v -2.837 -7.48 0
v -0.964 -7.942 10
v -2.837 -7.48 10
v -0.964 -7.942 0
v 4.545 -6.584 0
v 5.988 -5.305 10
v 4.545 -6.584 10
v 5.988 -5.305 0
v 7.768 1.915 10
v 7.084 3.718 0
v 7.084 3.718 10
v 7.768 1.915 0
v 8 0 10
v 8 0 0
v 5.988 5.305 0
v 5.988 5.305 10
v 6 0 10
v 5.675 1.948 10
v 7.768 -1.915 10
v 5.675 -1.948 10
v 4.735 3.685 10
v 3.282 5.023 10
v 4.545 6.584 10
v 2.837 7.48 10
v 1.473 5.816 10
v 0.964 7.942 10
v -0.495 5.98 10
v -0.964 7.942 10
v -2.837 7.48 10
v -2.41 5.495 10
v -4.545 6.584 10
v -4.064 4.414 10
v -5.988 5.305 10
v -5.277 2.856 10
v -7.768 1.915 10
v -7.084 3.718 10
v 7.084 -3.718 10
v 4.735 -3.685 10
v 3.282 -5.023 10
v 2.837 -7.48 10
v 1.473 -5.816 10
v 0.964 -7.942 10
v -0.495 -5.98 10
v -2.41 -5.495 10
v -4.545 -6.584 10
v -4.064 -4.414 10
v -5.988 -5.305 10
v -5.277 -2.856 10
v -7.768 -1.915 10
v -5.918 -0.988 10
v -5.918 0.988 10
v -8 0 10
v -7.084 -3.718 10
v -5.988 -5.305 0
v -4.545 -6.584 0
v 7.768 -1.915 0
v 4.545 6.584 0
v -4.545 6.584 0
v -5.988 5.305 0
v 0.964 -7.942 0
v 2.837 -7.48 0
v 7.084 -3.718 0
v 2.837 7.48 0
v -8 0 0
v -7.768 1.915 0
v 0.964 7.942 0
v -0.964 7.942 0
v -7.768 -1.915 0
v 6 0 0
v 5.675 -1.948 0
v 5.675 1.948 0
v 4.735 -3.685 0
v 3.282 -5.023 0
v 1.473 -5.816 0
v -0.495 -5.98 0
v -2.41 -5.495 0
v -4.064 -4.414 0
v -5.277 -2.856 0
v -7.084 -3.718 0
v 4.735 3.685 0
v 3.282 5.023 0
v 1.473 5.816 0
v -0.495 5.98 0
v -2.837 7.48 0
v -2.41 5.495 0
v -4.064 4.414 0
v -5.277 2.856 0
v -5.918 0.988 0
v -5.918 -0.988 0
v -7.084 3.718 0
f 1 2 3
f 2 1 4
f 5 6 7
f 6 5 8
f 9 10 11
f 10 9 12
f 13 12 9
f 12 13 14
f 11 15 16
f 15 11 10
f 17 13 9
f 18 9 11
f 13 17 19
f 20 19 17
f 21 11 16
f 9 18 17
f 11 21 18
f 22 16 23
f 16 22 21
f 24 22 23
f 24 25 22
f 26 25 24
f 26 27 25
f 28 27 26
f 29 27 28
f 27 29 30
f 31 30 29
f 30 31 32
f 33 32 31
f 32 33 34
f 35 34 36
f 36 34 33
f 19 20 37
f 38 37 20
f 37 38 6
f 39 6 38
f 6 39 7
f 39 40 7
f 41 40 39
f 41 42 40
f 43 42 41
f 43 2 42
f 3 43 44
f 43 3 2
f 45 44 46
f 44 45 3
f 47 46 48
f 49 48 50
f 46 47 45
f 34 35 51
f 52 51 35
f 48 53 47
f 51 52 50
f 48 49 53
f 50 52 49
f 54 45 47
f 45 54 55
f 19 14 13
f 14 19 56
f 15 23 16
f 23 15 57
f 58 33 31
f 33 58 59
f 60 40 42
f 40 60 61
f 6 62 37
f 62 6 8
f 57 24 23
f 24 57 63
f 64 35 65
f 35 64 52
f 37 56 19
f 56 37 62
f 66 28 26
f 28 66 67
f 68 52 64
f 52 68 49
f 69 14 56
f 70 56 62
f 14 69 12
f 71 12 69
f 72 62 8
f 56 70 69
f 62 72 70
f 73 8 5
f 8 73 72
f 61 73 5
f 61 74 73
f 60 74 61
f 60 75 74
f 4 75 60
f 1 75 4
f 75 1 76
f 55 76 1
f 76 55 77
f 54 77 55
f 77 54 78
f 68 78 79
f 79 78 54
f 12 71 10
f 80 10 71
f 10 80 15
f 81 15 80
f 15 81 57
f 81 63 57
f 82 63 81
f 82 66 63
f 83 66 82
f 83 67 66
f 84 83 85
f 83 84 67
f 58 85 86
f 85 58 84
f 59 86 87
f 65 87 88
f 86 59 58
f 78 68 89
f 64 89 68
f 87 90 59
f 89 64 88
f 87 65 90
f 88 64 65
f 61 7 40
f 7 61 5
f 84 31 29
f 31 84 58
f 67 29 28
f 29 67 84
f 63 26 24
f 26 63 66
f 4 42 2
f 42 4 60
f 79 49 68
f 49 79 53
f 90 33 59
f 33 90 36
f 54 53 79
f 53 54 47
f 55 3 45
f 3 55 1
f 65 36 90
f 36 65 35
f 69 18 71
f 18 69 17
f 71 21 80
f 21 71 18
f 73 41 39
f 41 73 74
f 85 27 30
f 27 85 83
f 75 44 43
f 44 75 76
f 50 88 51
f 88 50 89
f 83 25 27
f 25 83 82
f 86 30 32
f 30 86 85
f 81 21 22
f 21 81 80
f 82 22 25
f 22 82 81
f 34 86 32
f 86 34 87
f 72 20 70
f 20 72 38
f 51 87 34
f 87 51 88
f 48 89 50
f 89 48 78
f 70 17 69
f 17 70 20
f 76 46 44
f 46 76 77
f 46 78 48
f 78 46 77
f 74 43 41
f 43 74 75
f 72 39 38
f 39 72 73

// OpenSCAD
// parameters
R_OUTER = 8;
R_INNER = 6;
HEIGHT = 10;

module Pipe(r_outer, r_inner, h, $fn=0, $fa=12, $fs=2) {
    difference() {
        cylinder(r=r_outer, h=h, $fn=$fn, $fa=$fa, $fs=$fs);
        cylinder(r=r_inner, h=h, $fn=$fn, $fa=$fa, $fs=$fs);
    }
}

// main
Pipe(R_OUTER, R_INNER, HEIGHT);
